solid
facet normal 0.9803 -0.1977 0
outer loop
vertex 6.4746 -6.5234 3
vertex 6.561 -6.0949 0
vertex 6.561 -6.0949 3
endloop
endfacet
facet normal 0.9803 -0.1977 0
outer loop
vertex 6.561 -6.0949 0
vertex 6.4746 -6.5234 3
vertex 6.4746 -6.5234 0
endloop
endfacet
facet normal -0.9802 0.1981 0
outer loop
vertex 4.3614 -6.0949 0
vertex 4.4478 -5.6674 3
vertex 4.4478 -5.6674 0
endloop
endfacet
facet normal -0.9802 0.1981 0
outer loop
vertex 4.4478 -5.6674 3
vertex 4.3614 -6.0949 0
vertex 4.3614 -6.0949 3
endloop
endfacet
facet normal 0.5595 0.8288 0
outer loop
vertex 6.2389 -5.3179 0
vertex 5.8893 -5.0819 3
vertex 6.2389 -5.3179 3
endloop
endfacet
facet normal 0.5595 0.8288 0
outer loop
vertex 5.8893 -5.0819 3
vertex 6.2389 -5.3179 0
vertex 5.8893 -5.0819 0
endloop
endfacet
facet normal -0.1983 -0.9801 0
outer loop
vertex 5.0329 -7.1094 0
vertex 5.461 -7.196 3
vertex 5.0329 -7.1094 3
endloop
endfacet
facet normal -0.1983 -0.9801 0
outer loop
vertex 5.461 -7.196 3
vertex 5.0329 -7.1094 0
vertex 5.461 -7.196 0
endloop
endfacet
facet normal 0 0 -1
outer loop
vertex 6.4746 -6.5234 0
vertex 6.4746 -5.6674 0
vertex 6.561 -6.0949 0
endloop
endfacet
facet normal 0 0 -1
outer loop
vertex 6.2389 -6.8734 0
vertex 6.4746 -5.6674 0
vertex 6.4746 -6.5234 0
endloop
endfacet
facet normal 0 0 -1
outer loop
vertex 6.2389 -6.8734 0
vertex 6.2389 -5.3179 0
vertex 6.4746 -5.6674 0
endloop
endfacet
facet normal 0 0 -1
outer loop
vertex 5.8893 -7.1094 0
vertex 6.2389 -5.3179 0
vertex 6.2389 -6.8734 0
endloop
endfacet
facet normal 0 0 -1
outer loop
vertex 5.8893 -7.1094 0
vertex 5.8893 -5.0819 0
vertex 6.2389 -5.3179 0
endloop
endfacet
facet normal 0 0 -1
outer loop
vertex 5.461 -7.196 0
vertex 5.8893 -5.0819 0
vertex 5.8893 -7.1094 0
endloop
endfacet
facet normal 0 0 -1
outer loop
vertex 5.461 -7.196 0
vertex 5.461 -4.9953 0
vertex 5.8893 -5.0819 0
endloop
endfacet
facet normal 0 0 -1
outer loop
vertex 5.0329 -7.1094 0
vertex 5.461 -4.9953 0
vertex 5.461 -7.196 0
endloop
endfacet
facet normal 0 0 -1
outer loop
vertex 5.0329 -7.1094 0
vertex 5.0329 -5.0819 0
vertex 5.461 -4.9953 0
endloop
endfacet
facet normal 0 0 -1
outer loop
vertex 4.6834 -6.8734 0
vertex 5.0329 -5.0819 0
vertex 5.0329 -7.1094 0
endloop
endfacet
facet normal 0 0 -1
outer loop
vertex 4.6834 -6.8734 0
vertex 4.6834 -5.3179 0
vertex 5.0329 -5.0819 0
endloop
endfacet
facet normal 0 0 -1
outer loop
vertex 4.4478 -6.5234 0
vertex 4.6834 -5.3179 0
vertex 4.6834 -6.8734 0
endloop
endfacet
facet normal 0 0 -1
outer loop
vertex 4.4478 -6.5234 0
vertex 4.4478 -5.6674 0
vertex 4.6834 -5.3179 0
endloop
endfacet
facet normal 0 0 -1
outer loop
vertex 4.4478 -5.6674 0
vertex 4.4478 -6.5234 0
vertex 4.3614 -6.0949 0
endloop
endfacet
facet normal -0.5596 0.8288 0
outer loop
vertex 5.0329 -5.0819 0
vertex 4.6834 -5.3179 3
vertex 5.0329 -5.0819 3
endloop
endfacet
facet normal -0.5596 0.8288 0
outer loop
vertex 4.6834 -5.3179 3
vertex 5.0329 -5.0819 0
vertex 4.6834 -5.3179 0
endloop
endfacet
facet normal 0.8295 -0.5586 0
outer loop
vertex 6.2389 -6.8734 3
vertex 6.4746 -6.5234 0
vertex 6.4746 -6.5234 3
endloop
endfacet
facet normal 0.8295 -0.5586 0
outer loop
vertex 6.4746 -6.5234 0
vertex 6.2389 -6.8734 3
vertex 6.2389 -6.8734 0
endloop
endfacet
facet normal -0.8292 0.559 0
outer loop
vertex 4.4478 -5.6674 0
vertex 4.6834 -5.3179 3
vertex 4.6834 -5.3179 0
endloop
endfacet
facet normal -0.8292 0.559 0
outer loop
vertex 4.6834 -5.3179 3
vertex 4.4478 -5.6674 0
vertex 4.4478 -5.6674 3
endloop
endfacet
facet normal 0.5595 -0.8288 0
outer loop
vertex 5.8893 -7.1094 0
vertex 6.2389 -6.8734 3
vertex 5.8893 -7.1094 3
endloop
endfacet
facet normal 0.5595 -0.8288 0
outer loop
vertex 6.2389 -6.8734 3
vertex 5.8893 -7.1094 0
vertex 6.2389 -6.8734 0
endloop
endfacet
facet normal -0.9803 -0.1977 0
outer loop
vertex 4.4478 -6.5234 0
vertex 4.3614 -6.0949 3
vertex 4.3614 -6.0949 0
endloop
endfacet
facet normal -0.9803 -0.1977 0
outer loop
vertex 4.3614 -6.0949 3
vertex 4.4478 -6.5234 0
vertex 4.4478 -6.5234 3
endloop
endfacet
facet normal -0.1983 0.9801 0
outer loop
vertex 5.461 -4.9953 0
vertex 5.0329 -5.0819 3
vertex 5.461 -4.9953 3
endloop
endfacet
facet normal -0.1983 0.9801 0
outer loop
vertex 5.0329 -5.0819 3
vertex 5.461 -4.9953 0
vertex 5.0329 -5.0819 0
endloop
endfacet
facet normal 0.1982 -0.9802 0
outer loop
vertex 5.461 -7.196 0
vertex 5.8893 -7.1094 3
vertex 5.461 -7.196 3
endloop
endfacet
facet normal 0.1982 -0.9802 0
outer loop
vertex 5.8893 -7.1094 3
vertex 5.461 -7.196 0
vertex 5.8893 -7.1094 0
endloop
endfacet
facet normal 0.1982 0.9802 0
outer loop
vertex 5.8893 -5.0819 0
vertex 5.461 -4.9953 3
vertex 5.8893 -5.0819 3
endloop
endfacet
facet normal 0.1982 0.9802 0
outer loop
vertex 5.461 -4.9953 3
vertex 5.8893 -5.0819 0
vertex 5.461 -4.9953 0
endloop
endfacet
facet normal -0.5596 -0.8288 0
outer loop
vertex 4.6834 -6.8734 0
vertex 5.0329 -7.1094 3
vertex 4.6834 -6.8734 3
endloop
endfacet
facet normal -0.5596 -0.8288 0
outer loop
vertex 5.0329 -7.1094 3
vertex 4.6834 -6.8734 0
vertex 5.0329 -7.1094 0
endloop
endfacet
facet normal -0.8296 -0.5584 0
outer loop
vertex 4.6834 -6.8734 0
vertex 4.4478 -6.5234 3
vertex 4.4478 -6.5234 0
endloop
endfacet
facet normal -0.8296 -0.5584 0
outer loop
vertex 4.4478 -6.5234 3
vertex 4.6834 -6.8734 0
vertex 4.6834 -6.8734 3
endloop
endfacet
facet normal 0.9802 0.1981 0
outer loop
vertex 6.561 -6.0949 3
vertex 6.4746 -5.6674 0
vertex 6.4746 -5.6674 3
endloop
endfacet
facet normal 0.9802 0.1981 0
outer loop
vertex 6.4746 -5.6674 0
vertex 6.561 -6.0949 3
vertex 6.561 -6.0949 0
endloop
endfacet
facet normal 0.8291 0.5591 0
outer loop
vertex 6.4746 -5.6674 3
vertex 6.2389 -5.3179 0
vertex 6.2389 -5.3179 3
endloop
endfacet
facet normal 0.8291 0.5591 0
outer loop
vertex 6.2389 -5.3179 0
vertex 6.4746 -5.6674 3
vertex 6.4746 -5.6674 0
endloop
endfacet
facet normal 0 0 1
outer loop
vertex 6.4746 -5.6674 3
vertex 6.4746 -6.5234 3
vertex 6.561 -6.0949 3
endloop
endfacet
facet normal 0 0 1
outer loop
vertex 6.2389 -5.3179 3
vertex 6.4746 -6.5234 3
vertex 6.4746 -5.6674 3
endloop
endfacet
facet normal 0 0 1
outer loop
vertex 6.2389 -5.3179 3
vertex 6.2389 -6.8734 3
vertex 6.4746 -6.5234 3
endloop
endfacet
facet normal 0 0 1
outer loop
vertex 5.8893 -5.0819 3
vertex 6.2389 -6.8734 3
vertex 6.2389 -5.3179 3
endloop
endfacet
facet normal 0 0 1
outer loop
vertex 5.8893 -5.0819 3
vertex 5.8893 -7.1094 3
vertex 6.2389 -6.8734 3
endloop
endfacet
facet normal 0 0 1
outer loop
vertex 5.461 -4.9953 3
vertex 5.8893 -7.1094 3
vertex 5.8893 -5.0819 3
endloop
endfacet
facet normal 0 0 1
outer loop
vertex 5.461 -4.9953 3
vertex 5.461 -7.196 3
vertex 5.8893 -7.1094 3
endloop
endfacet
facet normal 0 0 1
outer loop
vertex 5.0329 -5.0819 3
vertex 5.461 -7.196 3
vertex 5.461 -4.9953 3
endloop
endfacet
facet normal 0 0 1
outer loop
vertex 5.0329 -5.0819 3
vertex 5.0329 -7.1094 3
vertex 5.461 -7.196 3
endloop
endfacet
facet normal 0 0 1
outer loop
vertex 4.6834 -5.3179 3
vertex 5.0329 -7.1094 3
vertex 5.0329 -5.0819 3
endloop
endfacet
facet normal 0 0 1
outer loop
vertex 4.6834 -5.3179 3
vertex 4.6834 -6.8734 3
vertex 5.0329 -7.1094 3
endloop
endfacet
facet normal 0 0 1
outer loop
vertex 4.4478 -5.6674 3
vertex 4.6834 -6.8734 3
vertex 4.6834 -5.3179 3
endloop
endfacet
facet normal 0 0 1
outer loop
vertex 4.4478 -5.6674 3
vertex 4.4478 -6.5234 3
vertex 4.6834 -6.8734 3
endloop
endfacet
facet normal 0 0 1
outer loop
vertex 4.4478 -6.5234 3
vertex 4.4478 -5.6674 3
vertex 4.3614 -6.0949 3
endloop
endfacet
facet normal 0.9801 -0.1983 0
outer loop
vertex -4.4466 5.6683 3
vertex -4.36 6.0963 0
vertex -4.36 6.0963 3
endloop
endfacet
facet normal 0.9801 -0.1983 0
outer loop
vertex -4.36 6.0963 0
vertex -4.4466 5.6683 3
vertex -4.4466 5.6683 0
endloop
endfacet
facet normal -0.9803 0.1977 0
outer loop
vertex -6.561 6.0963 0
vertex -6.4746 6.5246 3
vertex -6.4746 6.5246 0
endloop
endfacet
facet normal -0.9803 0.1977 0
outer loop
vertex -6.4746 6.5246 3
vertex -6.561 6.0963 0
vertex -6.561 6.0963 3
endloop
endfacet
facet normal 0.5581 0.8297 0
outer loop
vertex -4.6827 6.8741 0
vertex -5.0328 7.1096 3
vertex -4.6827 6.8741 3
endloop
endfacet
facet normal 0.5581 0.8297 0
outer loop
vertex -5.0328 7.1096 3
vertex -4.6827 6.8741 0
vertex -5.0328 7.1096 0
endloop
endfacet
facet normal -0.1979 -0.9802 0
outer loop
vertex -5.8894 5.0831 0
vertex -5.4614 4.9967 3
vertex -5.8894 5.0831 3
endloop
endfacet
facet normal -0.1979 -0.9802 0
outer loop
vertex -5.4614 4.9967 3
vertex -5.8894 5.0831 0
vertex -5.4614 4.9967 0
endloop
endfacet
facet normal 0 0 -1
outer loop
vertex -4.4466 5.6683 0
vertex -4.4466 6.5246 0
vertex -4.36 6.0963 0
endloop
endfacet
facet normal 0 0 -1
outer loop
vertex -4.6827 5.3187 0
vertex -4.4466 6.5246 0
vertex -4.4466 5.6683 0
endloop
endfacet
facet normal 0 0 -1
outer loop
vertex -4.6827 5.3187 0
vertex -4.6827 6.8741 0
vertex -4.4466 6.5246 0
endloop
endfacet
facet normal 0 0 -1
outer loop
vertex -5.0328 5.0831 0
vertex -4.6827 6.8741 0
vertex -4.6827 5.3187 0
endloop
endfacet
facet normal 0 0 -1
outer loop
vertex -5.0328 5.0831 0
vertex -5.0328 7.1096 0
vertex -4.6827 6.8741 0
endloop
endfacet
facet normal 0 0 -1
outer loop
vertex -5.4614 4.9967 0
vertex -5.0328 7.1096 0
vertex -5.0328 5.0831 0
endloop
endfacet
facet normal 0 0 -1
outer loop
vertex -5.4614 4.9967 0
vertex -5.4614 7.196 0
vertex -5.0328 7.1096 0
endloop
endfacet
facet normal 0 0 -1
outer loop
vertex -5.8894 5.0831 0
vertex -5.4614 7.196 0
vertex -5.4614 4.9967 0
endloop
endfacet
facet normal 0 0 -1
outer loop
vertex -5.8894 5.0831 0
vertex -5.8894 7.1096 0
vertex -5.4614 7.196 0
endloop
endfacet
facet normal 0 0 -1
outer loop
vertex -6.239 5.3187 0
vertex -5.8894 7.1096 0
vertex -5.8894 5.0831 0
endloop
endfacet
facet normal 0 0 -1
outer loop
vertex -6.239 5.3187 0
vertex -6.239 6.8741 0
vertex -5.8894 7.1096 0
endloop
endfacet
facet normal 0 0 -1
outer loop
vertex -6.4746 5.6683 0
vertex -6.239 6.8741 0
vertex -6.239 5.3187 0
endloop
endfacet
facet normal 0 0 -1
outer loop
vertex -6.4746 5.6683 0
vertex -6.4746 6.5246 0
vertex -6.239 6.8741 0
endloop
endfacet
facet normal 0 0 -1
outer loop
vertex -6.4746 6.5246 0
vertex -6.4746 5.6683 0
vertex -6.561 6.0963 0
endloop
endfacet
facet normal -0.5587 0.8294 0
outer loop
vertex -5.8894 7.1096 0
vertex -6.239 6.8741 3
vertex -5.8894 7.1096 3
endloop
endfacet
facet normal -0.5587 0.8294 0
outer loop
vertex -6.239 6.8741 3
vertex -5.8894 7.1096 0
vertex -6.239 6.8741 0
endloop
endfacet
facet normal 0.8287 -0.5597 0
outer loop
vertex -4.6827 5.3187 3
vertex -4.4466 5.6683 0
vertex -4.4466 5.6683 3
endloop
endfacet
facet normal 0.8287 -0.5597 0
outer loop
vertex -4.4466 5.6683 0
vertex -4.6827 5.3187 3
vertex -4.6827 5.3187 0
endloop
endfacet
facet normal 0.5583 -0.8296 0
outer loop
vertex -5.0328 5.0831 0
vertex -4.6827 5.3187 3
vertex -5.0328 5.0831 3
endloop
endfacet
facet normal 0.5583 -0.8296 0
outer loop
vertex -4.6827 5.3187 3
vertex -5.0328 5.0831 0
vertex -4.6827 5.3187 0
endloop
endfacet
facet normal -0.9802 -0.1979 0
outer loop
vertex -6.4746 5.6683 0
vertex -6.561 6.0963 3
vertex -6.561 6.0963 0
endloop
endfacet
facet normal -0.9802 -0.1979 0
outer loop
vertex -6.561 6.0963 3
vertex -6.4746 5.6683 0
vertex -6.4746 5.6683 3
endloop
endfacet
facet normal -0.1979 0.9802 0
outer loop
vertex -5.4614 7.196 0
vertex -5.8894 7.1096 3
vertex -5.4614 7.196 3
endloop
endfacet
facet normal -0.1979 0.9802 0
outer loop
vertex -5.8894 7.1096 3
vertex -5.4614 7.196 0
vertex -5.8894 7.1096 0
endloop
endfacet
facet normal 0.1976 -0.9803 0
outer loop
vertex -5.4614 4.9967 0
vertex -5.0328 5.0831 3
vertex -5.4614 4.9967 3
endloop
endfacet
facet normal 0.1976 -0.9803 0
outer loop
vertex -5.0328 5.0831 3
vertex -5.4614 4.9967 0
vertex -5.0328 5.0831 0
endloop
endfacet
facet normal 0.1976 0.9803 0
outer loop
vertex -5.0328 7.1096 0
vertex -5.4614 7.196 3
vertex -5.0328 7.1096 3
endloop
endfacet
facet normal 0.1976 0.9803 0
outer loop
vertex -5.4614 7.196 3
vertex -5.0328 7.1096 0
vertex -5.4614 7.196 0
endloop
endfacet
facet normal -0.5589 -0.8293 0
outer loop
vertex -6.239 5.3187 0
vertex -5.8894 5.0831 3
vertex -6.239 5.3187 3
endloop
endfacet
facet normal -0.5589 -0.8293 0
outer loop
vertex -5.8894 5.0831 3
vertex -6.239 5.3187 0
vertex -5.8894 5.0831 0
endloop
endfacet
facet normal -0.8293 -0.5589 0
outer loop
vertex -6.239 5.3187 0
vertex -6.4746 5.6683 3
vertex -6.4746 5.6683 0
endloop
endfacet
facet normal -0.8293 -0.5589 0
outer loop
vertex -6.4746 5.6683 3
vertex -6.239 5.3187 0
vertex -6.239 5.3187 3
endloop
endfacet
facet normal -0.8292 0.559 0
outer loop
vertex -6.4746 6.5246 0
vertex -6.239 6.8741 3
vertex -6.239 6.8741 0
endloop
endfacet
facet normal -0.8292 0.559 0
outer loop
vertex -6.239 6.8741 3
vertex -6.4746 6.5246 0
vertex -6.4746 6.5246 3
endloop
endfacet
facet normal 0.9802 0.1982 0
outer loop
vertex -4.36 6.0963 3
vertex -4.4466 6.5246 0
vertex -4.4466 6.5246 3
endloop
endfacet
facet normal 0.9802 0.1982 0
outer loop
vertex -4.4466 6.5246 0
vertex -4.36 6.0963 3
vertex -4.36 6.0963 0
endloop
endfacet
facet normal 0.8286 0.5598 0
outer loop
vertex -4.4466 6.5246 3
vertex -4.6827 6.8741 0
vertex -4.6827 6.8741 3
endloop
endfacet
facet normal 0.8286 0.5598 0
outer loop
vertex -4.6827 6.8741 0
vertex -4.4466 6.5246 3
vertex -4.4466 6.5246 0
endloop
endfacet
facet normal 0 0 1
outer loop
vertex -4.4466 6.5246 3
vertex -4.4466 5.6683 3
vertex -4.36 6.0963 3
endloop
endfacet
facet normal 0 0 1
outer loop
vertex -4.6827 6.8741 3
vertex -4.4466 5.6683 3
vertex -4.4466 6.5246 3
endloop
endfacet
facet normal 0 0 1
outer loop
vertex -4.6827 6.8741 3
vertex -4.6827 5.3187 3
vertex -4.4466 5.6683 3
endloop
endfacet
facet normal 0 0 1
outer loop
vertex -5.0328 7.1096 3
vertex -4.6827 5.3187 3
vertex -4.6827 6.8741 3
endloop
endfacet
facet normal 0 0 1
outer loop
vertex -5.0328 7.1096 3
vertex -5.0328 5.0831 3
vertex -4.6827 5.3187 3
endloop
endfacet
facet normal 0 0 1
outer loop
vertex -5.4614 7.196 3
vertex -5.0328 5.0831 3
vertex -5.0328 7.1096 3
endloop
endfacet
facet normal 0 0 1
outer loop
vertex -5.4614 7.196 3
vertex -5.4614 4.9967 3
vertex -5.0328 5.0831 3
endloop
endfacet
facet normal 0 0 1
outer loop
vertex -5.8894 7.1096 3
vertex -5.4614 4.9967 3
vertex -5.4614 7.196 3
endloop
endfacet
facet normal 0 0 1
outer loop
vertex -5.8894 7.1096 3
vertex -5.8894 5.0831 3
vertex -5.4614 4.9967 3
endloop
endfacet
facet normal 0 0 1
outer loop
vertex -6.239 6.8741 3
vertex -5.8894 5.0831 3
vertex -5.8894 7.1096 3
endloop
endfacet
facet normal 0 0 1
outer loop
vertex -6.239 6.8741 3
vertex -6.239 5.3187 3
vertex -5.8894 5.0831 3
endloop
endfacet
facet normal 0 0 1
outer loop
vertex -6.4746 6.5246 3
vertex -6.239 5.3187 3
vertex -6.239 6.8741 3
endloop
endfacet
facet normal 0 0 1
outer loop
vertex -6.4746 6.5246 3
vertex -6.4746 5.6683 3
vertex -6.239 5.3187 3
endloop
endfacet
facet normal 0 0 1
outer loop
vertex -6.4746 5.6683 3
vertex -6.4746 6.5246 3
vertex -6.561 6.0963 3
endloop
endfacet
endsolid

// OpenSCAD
// Module names are of the form poly_<inkscape-path-id>().  As a result,
// you can associate a polygon in this OpenSCAD program with the corresponding
// SVG element in the Inkscape document by looking for the XML element with
// the attribute id="inkscape-path-id".

// fudge value is used to ensure that subtracted solids are a tad taller
// in the z dimension than the polygon being subtracted from.  This helps
// keep the resulting .stl file manifold.
fudge = 0.1;

module poly_path14(h)
{
  scale([25.4/90, -25.4/90, 1]) union()
  {
    linear_extrude(height=h)
      polygon([[23.247500,21.596250],[22.941387,23.114434],[22.106406,24.354531],[20.867598,25.190801],[19.350000,25.497500],[17.833125,25.190801],[16.594688,24.354531],[15.759844,23.114434],[15.453750,21.596250],[15.759844,20.081484],[16.594688,18.842812],[17.833125,18.006797],[19.350000,17.700000],[20.867598,18.006797],[22.106406,18.842812],[22.941387,20.081484],[23.247500,21.596250]]);
  }
}

module poly_path16(h)
{
  scale([25.4/90, -25.4/90, 1]) union()
  {
    linear_extrude(height=h)
      polygon([[-15.448750,-21.601250],[-15.755645,-20.084375],[-16.592344,-18.845937],[-17.832871,-18.011094],[-19.351250,-17.705000],[-20.868125,-18.011094],[-22.106563,-18.845937],[-22.941406,-20.084375],[-23.247500,-21.601250],[-22.941406,-23.118652],[-22.106563,-24.357031],[-20.868125,-25.191582],[-19.351250,-25.497500],[-17.832871,-25.191582],[-16.592344,-24.357031],[-15.755645,-23.118652],[-15.448750,-21.601250]]);
  }
}

module pcb_holes(h)
{

poly_path14(h);
poly_path16(h);
}

pcb_holes(3);
